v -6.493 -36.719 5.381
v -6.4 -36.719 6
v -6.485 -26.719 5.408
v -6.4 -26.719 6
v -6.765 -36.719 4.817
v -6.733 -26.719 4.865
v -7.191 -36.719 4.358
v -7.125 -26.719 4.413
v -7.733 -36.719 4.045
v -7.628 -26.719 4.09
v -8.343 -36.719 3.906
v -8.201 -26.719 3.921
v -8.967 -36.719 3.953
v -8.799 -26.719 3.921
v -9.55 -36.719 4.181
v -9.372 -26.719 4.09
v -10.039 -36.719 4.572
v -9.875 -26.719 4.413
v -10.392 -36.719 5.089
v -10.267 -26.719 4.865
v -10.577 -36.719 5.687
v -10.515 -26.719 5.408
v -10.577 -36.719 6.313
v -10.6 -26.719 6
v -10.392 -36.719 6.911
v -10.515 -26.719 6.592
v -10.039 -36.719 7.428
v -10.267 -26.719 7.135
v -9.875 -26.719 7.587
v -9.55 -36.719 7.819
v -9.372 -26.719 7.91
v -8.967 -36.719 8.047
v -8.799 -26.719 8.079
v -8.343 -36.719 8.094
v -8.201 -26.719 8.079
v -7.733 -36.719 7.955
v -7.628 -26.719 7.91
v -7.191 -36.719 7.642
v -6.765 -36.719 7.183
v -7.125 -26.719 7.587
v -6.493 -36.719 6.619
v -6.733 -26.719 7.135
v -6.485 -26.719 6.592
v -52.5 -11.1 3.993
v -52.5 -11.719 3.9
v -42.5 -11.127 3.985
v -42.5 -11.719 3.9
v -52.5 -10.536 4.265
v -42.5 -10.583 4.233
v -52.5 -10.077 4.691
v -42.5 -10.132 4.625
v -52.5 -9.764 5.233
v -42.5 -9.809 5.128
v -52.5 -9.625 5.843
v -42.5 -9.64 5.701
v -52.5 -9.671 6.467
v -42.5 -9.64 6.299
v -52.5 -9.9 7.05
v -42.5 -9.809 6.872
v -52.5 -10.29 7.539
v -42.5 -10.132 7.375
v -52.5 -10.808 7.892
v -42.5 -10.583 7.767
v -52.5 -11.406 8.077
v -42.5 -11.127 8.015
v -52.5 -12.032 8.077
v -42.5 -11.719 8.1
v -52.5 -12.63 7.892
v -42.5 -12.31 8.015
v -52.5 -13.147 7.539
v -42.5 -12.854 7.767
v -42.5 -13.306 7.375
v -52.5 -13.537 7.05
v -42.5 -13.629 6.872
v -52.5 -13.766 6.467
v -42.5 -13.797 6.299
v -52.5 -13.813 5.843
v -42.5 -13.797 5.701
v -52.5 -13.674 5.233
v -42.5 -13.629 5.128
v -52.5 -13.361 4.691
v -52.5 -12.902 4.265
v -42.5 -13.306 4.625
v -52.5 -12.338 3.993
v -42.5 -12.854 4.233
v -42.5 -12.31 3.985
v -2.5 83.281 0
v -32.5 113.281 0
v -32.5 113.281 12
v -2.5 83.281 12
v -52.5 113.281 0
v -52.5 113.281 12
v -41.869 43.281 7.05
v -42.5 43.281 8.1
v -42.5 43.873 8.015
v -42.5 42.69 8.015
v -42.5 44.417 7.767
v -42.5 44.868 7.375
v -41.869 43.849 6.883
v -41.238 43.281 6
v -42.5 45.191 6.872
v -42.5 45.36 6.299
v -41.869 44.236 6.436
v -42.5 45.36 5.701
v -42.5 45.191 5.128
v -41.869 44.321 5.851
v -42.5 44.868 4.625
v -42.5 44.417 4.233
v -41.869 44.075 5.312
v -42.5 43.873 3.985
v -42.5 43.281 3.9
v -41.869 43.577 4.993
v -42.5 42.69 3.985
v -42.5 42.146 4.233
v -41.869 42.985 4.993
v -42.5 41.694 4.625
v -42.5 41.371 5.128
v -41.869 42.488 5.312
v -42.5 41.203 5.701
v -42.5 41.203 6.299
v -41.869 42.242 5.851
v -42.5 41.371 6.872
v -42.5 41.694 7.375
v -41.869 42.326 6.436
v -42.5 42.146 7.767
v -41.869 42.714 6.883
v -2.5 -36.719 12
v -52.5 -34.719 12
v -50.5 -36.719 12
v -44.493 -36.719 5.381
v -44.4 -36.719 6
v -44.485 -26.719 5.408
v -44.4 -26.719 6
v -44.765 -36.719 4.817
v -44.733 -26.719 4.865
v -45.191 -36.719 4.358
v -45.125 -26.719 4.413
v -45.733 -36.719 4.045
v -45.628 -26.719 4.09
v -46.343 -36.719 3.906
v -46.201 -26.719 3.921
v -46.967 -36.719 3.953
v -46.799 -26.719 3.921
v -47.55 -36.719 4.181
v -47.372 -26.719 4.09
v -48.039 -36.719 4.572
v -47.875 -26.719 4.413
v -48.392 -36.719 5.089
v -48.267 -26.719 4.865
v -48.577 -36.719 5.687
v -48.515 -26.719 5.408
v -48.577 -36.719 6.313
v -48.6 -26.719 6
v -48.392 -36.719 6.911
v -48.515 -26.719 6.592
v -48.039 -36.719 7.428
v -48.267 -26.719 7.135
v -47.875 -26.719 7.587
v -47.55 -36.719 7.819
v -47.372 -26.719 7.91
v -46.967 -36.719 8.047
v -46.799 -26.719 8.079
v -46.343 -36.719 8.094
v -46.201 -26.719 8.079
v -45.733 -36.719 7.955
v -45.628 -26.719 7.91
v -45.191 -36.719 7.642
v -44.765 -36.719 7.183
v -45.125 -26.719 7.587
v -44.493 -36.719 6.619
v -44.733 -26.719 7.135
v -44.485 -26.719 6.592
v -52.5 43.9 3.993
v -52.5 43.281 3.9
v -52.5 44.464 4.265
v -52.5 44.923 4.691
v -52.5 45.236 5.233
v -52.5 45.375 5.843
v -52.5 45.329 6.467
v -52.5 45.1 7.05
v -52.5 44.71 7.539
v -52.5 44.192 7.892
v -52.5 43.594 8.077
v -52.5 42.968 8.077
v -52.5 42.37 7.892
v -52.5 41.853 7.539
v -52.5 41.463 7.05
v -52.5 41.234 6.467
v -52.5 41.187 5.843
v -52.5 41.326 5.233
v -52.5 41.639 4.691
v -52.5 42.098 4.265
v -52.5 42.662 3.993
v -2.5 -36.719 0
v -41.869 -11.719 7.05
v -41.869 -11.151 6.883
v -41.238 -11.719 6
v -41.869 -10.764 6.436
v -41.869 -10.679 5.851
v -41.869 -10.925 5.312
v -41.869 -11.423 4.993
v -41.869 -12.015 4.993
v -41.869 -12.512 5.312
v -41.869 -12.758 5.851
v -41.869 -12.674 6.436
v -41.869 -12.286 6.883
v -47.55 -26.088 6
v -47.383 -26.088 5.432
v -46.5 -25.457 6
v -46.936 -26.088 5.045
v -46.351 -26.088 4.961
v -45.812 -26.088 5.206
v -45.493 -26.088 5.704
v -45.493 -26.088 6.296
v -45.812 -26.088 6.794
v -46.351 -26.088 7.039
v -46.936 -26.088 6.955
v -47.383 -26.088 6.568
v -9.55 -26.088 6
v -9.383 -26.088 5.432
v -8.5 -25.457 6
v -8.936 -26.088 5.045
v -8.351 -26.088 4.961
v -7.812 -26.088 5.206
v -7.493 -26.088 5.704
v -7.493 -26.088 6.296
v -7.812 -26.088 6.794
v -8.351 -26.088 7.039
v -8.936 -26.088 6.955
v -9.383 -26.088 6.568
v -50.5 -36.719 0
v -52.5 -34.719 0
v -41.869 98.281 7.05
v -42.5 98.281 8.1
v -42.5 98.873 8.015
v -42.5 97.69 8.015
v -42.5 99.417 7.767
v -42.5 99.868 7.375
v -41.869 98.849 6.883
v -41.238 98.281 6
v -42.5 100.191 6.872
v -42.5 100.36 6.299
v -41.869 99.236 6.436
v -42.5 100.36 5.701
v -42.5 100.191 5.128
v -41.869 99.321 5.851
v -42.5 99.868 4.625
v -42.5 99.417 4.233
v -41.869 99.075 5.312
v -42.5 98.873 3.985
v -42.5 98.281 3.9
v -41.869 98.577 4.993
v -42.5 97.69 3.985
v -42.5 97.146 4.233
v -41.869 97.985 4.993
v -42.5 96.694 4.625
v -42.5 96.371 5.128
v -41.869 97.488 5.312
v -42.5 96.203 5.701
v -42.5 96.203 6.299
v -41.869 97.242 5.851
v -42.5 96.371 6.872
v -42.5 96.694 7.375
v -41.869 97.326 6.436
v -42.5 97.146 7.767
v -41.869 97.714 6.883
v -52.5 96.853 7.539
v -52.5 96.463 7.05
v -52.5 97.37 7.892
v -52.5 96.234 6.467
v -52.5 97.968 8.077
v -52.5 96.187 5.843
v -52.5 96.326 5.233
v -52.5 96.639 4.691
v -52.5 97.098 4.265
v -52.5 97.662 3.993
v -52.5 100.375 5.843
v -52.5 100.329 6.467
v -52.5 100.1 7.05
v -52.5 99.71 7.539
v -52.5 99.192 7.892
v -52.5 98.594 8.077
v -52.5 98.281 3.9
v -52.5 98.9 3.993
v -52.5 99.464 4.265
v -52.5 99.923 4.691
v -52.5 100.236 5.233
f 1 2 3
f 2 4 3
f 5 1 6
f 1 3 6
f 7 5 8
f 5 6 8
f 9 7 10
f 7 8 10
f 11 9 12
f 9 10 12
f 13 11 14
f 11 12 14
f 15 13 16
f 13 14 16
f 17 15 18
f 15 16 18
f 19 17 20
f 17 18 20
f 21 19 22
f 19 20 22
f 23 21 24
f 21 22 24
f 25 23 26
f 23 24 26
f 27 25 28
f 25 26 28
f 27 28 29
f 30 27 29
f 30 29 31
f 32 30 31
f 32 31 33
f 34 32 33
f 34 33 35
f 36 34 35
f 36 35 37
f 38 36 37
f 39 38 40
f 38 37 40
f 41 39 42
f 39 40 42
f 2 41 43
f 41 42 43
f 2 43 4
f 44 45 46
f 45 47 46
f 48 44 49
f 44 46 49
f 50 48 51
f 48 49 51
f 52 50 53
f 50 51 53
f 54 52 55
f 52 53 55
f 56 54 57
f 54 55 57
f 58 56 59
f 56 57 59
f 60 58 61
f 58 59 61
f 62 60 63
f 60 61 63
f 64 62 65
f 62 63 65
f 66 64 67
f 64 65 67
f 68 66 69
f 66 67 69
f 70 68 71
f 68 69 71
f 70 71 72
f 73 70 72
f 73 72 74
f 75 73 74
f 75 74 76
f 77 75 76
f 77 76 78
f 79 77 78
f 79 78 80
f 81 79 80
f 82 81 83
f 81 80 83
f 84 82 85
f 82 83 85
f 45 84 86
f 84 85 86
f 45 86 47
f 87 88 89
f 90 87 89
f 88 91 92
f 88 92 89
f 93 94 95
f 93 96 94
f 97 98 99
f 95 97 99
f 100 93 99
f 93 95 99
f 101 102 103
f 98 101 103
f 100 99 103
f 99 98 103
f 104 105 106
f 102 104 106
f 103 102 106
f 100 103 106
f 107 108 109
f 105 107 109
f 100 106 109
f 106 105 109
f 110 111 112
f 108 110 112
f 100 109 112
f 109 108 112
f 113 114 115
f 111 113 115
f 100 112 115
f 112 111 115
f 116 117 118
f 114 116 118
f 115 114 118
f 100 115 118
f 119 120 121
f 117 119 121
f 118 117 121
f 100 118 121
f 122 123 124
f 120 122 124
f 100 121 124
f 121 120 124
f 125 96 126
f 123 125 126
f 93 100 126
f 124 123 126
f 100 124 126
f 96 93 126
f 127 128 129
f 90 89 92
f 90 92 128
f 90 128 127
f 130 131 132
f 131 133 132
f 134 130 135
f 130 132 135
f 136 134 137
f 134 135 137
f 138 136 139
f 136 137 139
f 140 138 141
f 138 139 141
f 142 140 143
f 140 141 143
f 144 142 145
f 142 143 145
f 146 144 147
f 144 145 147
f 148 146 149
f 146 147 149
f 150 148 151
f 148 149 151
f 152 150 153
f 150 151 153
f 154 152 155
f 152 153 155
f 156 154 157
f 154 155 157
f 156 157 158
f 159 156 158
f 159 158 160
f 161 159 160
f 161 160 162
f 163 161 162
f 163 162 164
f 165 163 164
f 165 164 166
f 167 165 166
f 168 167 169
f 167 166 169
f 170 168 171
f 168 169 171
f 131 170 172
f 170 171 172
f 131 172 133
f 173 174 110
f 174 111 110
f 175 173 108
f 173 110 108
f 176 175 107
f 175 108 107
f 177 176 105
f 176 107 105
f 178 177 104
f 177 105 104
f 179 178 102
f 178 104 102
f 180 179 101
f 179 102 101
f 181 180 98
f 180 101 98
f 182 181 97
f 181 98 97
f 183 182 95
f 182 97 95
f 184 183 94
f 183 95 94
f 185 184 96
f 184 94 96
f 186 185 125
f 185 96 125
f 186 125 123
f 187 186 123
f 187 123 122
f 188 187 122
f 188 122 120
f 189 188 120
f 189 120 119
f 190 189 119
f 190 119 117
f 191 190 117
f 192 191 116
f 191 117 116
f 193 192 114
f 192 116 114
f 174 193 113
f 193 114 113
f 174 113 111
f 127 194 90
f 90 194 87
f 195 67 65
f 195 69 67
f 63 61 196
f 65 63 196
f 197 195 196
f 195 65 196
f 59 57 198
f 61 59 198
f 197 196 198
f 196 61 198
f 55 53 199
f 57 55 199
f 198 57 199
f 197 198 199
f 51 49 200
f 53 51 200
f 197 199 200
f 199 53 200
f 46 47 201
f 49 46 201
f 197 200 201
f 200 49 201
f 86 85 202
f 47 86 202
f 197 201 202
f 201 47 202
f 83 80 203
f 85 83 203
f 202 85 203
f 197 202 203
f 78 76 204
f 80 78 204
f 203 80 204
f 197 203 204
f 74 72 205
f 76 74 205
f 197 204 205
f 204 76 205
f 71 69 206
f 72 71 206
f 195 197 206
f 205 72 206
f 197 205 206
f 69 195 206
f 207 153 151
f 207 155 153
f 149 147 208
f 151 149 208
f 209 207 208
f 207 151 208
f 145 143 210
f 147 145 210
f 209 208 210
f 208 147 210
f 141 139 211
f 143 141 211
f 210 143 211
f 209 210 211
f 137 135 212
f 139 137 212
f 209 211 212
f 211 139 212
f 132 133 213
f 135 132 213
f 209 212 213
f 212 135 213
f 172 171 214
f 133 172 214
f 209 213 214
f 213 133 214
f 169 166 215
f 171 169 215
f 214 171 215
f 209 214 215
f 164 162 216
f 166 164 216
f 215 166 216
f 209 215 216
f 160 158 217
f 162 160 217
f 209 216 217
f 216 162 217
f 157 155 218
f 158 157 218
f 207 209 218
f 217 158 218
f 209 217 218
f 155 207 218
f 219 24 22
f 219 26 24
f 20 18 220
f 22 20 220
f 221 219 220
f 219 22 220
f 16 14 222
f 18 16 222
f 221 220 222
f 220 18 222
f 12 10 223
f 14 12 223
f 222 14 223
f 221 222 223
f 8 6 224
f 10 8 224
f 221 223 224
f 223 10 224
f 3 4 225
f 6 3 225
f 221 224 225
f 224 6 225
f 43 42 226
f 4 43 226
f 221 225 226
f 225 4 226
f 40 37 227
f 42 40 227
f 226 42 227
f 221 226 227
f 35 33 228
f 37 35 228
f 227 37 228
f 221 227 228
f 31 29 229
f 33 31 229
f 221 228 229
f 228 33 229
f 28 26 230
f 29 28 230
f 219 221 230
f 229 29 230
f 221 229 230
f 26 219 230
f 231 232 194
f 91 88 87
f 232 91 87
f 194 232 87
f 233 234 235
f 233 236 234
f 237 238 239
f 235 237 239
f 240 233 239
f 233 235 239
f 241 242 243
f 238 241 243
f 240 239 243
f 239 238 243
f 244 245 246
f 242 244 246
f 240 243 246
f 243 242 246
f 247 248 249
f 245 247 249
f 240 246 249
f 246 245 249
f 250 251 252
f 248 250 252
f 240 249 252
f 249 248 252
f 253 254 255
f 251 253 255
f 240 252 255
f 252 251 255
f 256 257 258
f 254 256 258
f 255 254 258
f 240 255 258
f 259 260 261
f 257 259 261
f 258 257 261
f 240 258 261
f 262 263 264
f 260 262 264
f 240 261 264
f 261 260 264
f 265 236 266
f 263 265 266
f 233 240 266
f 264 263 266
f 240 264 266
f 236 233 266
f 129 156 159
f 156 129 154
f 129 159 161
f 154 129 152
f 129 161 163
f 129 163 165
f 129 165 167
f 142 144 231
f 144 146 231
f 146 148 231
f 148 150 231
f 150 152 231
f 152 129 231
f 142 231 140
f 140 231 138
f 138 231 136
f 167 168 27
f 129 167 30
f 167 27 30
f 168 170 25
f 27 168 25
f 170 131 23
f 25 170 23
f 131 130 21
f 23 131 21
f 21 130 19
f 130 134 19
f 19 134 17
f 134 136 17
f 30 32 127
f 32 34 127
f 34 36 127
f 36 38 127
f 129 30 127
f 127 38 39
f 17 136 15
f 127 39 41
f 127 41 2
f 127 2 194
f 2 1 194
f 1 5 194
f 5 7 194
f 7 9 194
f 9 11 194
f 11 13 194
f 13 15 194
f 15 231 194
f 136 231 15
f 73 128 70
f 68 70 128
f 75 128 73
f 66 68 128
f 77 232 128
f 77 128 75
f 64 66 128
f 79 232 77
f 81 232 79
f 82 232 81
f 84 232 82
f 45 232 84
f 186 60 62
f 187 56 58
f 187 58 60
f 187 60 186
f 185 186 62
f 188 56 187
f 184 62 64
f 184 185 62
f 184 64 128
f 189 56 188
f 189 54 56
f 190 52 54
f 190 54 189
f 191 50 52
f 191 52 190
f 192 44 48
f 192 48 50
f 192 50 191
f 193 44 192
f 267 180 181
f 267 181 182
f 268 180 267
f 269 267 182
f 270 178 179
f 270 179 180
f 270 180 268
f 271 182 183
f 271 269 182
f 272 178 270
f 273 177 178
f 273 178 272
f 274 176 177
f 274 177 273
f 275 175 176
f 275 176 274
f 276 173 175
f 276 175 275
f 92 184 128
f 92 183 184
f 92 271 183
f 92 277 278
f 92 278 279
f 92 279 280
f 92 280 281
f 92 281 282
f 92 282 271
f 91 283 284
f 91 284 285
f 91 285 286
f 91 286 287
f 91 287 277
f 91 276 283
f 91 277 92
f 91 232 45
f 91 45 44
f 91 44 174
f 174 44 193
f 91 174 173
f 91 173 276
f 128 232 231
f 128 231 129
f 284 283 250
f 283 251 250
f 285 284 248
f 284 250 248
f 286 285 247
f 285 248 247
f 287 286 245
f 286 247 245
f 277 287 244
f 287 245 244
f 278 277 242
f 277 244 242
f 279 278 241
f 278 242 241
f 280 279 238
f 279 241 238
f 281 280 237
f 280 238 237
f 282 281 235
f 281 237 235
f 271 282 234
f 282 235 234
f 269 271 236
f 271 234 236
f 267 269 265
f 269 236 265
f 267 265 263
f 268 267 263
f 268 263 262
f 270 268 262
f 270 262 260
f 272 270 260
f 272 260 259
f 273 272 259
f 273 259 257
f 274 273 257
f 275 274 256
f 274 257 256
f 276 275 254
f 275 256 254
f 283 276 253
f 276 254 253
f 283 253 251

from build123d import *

# Parameters (mm, degrees)
SKETCH1_W             = 50
SKETCH1_H             = 150
BOSS_EXTRUDE1_DEPTH   = 12
M5_TAPPED_HOLE1_D     = 4.2
M5_TAPPED_HOLE1_DEPTH = 10
M5_TAPPED_HOLE1_TIP   = 1.2618073
M5_TAPPED_HOLE2_D     = 4.2
M5_TAPPED_HOLE2_DEPTH = 10
M5_TAPPED_HOLE2_TIP   = 1.2618073
CHAMFER1_SIZE         = 30
CHAMFER2_SIZE         = 2


with BuildPart() as part:
    # Sketch1 → Boss-Extrude1 (new body)
    with BuildSketch(Plane.XY):
        with Locations((-27.5, 38.28125)):
            Rectangle(SKETCH1_W, SKETCH1_H)
    extrude(amount=BOSS_EXTRUDE1_DEPTH)

    # M5 Tapped Hole1
    with Locations(Plane.ZY.offset(52.5)):
        with Locations((6, 98.28125), (6, 43.28125), (6, -11.71875)):
            Hole(M5_TAPPED_HOLE1_D / 2, depth=M5_TAPPED_HOLE1_DEPTH)
            with Locations((0, 0, -(M5_TAPPED_HOLE1_DEPTH + M5_TAPPED_HOLE1_TIP / 2))):  # 118° drill point
                Cone(0, M5_TAPPED_HOLE1_D / 2, M5_TAPPED_HOLE1_TIP, mode=Mode.SUBTRACT)

    # M5 Tapped Hole2
    with Locations(Plane(origin=(0, -36.71875, 0), x_dir=(-1, 0, 0), z_dir=(0, -1, 0))):
        with Locations((46.5, -6), (8.5, -6)):
            Hole(M5_TAPPED_HOLE2_D / 2, depth=M5_TAPPED_HOLE2_DEPTH)
            with Locations((0, 0, -(M5_TAPPED_HOLE2_DEPTH + M5_TAPPED_HOLE2_TIP / 2))):  # 118° drill point
                Cone(0, M5_TAPPED_HOLE2_D / 2, M5_TAPPED_HOLE2_TIP, mode=Mode.SUBTRACT)

    # Chamfer1
    chamfer1_edges = [part.edges().sort_by_distance(p)[0] for p in [
        (-2.5, 113.28125, 6),
    ]]
    chamfer(chamfer1_edges, length=CHAMFER1_SIZE)

    # Chamfer2
    chamfer2_edges = [part.edges().sort_by_distance(p)[0] for p in [
        (-52.5, -36.71875, 6),
    ]]
    chamfer(chamfer2_edges, length=CHAMFER2_SIZE)


solid = part.part
